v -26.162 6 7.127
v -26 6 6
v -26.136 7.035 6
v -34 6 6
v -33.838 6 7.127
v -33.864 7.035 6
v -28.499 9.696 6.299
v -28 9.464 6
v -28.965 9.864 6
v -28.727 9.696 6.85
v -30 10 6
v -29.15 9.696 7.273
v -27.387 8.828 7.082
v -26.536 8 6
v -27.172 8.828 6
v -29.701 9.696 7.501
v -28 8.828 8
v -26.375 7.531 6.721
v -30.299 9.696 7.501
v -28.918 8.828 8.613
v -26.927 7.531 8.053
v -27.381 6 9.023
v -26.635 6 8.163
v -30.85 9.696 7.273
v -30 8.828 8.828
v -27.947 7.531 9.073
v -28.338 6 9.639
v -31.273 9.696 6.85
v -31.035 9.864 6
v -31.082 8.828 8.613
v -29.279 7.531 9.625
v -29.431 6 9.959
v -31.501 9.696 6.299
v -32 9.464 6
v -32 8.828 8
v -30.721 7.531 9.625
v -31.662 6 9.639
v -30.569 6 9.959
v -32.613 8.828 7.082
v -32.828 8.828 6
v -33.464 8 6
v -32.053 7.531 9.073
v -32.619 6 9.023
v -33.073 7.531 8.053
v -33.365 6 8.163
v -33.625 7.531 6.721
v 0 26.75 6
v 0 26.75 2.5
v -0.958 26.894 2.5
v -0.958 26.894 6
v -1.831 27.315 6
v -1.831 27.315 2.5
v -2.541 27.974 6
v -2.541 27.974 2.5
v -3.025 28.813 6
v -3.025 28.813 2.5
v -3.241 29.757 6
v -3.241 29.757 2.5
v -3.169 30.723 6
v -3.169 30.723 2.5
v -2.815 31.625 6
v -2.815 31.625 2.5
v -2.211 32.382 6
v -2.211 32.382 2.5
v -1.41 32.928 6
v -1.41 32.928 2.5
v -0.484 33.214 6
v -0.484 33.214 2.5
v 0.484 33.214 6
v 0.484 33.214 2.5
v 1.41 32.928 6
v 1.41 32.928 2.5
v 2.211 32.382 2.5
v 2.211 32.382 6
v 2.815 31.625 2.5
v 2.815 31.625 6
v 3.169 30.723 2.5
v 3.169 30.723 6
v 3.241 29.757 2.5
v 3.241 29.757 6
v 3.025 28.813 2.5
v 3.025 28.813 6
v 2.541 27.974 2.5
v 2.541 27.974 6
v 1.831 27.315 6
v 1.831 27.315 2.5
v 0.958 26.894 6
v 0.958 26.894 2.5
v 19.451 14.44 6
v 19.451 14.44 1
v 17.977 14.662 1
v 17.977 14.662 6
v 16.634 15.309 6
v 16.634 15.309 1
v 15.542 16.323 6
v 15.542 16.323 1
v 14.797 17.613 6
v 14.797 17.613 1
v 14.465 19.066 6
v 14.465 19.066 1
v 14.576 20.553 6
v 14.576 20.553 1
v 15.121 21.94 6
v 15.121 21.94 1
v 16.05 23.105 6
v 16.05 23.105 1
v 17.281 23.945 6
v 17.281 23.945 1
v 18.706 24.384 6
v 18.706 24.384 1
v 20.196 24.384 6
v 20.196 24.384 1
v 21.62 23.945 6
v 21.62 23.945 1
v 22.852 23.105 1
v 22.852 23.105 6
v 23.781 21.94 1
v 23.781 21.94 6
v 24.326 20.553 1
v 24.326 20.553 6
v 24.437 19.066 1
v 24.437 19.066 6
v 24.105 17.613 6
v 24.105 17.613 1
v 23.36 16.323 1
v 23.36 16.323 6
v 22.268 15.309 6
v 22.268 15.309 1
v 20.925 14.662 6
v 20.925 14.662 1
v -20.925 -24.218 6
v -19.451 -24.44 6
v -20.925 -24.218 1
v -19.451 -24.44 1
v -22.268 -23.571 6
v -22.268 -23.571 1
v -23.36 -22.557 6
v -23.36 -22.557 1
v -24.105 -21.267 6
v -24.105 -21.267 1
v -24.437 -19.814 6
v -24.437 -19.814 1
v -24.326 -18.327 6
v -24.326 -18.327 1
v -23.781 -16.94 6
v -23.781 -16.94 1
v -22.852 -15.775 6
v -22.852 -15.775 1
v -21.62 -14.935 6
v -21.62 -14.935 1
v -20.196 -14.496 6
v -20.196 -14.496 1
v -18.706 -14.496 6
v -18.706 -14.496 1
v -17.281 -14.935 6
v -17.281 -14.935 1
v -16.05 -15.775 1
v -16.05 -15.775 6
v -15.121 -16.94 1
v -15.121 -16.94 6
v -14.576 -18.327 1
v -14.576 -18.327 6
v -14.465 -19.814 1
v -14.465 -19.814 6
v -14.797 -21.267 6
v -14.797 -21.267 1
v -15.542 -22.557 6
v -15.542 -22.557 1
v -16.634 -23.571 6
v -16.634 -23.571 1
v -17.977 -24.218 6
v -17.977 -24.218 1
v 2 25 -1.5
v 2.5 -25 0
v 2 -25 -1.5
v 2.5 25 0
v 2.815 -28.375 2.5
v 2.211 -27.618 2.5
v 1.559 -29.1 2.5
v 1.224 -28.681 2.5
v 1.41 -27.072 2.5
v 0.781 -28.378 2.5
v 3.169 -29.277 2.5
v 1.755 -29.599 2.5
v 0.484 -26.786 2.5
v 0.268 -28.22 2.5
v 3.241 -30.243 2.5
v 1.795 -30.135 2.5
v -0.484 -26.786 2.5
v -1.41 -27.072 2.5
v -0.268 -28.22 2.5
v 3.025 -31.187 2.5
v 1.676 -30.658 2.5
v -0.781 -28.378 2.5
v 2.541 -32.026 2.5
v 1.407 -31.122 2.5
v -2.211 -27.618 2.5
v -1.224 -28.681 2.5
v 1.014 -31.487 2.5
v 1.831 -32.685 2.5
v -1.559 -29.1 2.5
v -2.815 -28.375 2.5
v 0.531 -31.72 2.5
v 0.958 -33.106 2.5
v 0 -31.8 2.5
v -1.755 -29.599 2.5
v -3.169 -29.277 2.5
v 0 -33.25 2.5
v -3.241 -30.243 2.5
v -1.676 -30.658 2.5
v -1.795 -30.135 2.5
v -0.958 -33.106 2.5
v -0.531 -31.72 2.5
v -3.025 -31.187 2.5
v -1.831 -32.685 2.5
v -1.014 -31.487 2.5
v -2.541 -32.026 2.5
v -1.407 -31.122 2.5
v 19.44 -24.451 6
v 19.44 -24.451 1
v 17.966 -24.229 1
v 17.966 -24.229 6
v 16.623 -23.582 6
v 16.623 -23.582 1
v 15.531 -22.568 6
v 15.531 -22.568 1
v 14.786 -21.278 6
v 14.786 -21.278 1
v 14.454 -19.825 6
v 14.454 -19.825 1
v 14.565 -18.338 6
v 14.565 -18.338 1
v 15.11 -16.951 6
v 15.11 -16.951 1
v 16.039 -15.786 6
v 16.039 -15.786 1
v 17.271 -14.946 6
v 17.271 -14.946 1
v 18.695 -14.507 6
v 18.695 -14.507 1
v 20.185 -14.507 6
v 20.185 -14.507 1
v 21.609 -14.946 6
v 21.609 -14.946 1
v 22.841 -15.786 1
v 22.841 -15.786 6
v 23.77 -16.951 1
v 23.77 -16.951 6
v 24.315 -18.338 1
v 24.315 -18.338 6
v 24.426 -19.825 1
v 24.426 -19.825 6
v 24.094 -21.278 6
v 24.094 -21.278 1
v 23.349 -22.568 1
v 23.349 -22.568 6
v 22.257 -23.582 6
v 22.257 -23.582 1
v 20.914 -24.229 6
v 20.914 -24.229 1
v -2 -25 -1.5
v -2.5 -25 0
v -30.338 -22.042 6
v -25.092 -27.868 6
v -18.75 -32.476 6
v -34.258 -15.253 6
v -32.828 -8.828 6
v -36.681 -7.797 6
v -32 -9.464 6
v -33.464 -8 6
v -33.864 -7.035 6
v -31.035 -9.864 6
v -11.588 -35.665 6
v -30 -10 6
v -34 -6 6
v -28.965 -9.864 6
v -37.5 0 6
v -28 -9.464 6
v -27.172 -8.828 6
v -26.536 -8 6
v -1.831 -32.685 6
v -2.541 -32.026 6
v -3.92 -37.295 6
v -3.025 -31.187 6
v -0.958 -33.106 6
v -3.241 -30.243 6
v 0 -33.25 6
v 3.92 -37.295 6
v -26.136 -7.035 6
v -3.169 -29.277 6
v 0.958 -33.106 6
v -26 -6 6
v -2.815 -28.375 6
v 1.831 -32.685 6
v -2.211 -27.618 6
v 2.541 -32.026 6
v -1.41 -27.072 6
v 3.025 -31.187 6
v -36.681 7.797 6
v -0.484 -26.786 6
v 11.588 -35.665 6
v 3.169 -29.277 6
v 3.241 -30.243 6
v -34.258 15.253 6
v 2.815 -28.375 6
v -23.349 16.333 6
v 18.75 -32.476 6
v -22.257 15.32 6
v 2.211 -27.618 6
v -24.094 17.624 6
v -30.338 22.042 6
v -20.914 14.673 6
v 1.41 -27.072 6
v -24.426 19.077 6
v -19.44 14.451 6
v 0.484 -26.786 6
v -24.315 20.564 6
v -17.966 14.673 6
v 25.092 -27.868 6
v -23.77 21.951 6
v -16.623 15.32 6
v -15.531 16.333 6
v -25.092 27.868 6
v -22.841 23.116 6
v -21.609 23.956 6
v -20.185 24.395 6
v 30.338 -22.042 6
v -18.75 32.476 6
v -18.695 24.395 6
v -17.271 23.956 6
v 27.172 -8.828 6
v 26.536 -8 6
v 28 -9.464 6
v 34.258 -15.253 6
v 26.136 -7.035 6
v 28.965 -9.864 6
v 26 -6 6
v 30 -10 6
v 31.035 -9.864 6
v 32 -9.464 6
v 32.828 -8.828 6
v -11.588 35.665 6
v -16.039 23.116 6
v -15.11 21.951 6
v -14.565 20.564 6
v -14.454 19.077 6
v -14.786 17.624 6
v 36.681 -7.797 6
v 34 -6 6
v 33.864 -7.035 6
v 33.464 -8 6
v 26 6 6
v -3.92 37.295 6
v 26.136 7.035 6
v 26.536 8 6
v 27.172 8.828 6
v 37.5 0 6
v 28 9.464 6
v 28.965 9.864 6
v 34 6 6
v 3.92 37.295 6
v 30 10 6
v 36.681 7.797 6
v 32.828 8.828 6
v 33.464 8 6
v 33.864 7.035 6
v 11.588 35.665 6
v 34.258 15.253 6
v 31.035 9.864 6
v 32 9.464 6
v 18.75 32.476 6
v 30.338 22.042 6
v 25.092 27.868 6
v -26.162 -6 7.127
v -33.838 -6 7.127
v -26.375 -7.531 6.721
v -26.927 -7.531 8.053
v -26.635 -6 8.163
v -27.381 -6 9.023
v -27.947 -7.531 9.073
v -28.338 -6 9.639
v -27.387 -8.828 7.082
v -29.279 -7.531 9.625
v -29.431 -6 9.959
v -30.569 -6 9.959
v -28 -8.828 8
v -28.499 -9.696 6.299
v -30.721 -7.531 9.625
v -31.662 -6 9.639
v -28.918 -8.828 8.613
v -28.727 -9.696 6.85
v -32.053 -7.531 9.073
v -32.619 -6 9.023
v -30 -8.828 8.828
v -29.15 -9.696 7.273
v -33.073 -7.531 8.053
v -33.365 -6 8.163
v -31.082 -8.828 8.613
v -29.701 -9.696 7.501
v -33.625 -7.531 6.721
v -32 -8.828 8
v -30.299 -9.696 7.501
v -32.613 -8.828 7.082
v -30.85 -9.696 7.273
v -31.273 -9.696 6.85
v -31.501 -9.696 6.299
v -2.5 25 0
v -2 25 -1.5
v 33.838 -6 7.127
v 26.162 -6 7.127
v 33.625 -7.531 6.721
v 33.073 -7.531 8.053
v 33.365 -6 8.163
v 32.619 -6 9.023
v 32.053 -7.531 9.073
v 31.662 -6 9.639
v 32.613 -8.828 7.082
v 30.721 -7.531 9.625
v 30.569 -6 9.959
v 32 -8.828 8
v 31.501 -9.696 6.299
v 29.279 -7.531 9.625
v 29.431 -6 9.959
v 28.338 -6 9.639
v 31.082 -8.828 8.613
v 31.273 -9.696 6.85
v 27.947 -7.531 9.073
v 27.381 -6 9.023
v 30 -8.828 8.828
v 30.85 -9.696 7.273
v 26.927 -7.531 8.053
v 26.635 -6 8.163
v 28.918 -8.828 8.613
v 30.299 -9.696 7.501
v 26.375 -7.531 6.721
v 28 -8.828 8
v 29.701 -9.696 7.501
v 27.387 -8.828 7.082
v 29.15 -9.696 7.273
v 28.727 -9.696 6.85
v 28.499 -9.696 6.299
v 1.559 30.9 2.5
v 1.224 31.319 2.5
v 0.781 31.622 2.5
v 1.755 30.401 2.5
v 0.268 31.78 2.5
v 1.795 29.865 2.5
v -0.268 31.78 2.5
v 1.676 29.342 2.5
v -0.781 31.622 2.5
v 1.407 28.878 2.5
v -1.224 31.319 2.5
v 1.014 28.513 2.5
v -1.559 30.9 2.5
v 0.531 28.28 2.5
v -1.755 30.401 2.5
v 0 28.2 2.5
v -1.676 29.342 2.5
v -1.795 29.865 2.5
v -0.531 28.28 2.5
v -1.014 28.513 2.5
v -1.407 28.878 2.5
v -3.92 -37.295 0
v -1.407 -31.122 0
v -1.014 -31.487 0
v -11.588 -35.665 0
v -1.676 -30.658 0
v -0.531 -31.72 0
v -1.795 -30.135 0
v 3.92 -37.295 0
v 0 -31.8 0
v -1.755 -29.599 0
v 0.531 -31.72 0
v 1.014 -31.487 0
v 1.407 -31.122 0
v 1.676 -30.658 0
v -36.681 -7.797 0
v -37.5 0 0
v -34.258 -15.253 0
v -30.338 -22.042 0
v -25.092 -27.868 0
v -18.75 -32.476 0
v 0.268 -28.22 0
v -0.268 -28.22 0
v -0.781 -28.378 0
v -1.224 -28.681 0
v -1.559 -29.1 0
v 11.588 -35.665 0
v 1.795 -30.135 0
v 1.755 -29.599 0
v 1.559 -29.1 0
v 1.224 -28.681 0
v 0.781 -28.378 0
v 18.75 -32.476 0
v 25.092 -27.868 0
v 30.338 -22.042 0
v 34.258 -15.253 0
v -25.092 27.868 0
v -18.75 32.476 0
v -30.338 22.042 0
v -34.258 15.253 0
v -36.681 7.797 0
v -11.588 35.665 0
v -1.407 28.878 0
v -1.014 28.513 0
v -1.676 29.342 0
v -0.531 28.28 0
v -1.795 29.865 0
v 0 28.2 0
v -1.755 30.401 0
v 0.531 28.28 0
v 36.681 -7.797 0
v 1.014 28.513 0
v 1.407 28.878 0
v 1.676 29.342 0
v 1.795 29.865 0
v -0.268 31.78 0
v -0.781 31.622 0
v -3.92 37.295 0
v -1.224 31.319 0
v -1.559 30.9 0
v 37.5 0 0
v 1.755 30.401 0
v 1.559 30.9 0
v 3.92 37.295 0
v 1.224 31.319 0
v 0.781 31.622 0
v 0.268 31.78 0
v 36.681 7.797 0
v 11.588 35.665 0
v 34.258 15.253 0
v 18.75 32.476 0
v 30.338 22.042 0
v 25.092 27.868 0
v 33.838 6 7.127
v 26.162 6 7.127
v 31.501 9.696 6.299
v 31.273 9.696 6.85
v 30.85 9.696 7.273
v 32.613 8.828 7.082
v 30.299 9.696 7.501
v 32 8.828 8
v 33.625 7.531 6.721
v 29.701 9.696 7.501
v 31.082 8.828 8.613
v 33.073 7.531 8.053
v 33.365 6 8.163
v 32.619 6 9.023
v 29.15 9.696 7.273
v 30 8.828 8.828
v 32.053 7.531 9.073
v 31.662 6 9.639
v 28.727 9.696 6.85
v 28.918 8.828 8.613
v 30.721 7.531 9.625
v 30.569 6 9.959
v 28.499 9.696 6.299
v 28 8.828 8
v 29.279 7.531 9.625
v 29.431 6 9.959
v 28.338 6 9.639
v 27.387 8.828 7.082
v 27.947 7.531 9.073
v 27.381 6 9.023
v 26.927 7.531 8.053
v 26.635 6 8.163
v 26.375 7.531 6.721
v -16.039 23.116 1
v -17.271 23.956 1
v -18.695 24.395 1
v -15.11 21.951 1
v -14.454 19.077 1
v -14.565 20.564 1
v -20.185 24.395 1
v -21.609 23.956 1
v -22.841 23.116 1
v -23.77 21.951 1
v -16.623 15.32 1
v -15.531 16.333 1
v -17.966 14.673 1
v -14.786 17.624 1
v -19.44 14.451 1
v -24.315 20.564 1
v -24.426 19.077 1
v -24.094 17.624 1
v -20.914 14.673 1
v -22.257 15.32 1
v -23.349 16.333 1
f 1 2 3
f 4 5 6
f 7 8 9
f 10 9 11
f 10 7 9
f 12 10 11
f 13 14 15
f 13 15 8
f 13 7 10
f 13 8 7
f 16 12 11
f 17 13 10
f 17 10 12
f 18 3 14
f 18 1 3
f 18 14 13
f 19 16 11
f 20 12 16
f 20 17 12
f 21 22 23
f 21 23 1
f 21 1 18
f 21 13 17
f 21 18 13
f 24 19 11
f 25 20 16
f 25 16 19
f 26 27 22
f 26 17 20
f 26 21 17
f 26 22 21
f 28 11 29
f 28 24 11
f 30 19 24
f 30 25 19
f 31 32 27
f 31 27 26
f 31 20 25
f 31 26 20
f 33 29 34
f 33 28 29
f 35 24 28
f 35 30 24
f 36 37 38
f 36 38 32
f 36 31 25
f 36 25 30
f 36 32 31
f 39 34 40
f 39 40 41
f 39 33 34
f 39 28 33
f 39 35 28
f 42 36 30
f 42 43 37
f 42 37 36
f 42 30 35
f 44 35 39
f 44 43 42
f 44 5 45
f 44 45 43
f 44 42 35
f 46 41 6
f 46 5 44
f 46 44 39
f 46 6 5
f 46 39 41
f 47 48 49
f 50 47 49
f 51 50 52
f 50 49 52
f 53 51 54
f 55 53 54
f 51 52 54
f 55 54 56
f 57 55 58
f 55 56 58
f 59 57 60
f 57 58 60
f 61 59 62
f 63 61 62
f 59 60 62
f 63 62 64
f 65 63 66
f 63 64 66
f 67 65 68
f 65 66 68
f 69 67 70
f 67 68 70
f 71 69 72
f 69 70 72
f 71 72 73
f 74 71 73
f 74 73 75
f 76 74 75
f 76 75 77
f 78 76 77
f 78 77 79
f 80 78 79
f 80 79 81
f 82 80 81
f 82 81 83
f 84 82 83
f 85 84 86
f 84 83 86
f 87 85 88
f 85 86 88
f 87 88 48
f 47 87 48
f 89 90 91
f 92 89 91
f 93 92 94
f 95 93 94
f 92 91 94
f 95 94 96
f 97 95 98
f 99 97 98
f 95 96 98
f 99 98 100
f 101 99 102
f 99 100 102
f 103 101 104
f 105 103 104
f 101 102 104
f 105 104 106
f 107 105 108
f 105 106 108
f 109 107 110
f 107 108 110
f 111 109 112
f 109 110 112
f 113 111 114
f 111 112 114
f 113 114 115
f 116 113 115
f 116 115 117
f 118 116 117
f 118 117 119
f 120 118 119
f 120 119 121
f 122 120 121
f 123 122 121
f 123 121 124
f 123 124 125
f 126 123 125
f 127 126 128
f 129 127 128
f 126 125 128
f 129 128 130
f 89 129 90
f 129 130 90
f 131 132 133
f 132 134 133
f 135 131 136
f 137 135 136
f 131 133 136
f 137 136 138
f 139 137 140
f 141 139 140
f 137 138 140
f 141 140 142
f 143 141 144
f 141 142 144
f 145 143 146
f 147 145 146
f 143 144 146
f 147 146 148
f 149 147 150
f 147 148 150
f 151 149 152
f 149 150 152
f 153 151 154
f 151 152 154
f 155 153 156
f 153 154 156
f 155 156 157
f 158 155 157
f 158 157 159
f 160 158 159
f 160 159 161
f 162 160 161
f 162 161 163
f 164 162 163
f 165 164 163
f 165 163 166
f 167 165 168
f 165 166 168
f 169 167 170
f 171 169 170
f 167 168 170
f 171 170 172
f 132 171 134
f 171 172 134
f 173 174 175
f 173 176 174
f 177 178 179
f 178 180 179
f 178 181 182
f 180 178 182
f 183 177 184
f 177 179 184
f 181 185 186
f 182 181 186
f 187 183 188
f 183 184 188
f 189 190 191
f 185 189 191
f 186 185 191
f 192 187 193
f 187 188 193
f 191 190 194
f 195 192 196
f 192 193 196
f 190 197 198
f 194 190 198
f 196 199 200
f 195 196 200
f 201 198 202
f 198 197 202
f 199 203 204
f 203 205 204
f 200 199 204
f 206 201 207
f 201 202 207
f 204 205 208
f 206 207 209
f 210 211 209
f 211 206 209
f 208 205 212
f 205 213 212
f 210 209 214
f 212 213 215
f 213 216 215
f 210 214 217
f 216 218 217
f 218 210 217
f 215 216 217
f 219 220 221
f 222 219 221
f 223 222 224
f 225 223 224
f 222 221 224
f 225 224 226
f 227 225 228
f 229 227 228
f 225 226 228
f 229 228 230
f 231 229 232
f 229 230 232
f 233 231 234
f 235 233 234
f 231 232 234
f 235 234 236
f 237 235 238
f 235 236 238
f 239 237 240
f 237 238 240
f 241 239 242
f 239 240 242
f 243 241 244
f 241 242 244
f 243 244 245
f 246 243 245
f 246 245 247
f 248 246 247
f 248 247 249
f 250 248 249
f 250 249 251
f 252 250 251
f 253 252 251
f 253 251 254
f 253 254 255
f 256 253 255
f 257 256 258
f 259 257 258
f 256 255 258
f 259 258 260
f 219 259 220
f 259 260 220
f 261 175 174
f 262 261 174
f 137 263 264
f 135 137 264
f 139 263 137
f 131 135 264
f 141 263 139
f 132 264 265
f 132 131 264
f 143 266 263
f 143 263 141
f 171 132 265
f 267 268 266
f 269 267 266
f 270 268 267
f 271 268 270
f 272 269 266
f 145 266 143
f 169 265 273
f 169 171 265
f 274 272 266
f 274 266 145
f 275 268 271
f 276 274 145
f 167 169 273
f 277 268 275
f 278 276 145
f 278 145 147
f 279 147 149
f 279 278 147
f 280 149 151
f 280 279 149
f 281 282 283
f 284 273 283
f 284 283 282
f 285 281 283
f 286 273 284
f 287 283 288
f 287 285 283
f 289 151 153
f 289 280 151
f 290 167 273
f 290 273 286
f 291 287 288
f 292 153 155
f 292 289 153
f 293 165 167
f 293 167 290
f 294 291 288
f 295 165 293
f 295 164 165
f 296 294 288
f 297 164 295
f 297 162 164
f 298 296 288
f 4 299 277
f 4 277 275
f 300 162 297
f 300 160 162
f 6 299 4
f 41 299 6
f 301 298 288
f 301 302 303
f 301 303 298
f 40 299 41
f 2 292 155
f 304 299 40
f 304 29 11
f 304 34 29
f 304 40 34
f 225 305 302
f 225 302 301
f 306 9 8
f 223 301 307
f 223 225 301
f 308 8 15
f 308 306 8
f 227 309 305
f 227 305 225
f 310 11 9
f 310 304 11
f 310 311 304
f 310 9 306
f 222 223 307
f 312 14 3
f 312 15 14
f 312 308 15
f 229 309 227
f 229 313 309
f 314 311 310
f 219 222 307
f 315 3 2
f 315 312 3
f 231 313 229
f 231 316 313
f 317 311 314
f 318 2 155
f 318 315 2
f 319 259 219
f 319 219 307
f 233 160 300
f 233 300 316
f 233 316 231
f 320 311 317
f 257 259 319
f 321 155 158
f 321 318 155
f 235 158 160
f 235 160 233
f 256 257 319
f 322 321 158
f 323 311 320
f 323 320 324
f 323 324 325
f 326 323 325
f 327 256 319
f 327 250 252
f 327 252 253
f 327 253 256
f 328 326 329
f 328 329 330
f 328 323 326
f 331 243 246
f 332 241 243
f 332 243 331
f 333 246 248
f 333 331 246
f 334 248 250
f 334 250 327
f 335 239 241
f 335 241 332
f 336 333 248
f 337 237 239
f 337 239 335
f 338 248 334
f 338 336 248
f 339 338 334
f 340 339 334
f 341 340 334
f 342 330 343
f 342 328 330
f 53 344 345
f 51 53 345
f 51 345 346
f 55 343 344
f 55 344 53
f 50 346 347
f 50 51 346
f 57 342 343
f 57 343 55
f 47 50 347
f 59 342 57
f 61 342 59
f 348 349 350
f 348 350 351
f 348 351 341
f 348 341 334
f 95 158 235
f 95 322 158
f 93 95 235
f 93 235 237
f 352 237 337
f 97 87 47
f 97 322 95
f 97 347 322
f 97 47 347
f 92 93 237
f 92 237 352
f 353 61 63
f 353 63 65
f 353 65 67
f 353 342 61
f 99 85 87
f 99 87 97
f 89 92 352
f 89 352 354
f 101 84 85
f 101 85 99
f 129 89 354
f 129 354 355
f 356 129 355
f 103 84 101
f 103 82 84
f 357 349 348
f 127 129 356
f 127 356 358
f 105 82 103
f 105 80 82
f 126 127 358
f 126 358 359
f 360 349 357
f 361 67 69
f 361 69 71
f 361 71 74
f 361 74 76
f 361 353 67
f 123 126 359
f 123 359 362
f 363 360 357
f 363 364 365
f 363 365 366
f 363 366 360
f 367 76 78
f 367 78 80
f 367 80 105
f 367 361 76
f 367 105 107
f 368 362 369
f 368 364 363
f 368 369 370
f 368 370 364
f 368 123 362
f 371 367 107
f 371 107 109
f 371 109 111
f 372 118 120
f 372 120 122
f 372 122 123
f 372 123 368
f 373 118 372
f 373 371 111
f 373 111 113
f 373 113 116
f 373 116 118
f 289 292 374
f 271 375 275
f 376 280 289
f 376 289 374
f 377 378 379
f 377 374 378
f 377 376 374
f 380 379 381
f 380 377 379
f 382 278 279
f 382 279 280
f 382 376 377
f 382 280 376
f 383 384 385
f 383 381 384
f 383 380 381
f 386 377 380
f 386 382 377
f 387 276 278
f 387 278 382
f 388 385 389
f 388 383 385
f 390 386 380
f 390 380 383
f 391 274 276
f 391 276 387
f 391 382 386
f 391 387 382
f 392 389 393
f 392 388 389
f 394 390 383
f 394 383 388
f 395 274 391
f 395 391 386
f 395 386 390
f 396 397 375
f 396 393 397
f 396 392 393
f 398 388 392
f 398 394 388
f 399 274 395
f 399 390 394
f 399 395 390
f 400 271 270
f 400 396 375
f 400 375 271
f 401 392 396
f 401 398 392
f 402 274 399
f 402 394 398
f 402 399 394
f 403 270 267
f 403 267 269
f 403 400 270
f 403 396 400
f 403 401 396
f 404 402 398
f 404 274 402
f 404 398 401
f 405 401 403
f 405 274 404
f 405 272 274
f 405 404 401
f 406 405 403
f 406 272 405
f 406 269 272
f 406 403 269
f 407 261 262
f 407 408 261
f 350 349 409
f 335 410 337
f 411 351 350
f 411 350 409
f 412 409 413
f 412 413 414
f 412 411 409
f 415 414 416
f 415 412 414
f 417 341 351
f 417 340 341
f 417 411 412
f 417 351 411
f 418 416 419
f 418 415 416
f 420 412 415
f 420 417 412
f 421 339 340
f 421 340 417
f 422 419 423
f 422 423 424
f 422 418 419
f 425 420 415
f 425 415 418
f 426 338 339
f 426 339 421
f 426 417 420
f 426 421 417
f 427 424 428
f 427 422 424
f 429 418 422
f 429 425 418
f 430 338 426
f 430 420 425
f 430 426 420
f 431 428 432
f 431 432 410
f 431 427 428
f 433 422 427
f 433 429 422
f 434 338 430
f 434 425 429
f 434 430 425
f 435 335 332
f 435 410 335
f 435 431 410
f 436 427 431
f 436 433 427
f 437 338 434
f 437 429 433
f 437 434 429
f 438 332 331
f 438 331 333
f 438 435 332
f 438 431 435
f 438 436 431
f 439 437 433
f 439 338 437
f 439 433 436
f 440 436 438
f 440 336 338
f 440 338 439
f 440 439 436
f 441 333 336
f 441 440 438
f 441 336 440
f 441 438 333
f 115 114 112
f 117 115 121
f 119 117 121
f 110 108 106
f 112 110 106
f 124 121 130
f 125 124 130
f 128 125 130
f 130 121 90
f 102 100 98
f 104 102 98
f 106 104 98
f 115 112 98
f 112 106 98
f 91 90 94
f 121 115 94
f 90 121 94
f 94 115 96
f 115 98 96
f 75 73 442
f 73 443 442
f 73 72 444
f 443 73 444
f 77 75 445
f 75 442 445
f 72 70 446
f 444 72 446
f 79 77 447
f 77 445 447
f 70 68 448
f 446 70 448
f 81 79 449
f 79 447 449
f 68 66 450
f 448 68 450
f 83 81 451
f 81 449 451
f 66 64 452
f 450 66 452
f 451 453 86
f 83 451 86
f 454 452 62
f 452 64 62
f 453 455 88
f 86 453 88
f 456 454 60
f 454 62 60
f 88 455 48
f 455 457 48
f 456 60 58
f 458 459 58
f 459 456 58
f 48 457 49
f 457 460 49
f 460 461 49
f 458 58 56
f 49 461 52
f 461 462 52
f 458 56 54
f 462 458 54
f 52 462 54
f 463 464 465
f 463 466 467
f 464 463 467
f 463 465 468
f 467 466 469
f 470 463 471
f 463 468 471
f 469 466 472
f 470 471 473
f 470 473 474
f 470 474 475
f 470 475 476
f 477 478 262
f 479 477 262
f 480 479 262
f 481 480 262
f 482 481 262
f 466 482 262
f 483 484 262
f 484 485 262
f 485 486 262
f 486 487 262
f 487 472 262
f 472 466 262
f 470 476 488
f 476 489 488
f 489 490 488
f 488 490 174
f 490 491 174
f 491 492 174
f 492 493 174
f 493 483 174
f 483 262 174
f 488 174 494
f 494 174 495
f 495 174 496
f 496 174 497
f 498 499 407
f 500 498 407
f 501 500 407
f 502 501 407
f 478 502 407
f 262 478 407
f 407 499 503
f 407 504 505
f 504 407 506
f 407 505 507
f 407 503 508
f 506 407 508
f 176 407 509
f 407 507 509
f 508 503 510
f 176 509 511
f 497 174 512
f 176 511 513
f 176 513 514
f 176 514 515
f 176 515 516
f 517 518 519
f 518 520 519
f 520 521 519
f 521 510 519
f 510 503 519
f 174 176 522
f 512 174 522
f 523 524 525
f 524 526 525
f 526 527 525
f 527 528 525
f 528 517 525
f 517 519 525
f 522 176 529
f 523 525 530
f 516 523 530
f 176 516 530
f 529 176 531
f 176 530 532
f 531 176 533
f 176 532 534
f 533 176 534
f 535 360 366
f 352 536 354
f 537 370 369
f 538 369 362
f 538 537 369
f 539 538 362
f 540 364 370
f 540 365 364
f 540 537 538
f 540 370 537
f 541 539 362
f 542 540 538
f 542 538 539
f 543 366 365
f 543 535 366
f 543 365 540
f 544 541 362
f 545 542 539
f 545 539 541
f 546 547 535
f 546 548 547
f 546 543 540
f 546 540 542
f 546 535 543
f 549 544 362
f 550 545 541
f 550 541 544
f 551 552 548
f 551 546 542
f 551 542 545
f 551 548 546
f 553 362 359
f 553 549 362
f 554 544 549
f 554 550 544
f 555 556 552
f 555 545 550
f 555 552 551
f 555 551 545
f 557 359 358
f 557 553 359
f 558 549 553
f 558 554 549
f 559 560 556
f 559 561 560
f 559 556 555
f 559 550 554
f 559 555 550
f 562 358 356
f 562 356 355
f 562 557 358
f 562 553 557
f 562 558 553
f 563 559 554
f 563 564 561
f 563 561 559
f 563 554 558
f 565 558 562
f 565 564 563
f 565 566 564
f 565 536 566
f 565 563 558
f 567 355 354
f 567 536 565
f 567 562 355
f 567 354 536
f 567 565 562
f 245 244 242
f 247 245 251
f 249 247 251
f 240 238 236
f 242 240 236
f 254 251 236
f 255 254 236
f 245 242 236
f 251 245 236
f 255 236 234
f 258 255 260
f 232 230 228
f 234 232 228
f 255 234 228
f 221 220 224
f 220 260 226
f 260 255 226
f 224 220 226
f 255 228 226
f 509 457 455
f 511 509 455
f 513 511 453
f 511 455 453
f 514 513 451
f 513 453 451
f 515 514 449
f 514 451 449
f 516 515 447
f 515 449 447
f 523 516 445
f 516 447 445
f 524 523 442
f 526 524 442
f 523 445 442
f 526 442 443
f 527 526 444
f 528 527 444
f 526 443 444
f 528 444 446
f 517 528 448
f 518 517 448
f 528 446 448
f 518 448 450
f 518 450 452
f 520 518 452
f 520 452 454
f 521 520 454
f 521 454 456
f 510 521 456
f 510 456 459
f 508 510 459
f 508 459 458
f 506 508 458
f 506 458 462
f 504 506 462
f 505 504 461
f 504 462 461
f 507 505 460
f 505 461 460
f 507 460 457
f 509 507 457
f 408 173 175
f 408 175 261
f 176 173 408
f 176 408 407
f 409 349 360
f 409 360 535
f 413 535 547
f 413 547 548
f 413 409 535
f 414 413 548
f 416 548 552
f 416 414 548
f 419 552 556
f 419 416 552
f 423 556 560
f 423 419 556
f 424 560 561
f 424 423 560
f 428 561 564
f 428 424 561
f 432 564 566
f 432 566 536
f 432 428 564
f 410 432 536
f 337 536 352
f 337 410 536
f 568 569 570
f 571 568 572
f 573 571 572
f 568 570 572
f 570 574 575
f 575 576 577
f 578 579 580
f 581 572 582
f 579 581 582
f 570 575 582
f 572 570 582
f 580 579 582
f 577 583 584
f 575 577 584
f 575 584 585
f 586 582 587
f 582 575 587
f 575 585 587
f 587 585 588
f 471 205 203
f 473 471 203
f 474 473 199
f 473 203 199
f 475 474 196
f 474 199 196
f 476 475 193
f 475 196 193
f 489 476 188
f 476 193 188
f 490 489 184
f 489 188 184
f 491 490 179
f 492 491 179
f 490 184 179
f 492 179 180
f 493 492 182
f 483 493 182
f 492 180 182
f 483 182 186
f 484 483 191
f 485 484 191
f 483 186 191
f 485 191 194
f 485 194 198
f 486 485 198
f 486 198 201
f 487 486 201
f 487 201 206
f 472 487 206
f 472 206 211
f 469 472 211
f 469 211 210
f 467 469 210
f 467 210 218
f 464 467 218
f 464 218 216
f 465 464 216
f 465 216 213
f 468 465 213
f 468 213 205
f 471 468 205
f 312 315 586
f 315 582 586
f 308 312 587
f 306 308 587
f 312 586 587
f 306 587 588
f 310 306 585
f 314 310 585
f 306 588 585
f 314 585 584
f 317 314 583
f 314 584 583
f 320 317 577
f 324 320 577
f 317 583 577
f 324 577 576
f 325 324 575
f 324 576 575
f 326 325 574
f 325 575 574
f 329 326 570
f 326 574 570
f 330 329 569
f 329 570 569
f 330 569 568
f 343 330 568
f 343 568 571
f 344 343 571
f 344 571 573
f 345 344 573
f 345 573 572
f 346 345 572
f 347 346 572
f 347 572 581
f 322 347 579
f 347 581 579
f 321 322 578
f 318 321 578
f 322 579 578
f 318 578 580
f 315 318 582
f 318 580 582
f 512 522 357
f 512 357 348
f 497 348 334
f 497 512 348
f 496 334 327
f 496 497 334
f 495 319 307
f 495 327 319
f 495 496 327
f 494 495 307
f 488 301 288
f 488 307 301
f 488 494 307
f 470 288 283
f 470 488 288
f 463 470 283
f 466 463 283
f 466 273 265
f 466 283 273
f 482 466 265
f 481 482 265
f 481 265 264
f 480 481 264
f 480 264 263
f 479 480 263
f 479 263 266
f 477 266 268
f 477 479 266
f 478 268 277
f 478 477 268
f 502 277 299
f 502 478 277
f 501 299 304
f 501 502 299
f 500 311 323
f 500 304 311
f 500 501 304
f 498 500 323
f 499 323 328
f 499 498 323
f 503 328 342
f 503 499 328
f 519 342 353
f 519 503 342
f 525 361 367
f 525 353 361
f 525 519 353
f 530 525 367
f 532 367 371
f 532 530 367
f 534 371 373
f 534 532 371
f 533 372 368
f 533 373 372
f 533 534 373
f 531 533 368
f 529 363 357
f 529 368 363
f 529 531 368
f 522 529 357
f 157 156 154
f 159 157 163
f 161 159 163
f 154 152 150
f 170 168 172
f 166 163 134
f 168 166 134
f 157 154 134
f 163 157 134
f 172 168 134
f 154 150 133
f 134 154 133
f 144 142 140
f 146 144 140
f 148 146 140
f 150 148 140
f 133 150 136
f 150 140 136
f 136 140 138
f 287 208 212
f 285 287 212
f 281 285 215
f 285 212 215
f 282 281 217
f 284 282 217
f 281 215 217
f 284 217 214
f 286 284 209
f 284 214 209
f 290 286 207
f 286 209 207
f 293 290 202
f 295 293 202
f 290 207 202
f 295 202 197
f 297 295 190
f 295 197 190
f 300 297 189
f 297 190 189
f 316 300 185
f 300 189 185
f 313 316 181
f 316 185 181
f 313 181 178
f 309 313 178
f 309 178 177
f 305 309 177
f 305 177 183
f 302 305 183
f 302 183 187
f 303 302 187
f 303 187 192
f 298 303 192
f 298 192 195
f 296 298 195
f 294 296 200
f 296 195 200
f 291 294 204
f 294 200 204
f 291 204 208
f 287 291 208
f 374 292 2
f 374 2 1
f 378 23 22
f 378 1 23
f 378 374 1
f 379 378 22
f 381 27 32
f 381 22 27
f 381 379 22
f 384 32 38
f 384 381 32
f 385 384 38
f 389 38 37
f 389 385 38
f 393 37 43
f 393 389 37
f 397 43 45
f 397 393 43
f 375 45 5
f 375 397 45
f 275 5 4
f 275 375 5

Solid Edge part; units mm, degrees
sketch "Sketch1" plane through (0, 0, 0) normal (0, 0, 1) x (1, 0, 0)
  circle A0 centre (0, 0) radius 37.5
extrude "Extrusionsausprägung_1" add sketch "Sketch1" along normal blind 6
hole "Bohrung_1" at (-19.44, 19.4509, 6) direction (0, 0, -1) diameter 10 depth 5
hole "Hole1" at (19.4509, 19.44, 6) direction (0, 0, -1) diameter 10 depth 5
hole "Hole2" at (19.44, -19.4509, 6) direction (0, 0, -1) diameter 10 depth 5
hole "Hole3" at (-19.4509, -19.44, 6) direction (0, 0, -1) diameter 10 depth 5
sketch "Sketch2" plane through (0, 0, 0) normal (0, -1, 0) x (1, 0, 0)
  line L0 (-2.5, 0) -> (2.5, 0)
  line L1 (2.5, 0) -> (2, -1.5)
  line L2 (2, -1.5) -> (-2, -1.5)
  line L3 (-2, -1.5) -> (-2.5, 0)
  dimension "D1" = 4
  dimension "D2" = 5
  dimension "D3" = 1.5
extrude "Extrusionsausprägung_2" add sketch "Sketch2" along normal mid plane 50
hole "Bohrung_5" at (0, 30, 6) direction (0, 0, -1) diameter 3.6 end up to next counterbore diameter 6.5 counterbore depth 3.5
hole "Hole4" at (0, -30, 6) direction (0, 0, -1) diameter 3.6 end up to next counterbore diameter 6.5 counterbore depth 3.5
sketch "Sketch3" plane through (0, 0, 6) normal (0, 0, 1) x (-1, 0, 0)
  line L0 (34, -6) -> (34, 6)
  arc A0 (34, 6) -> (30, 10) centre (30, 6) ccw
  arc A1 (30, -10) -> (34, -6) centre (30, -6) ccw
  dimension "D1" = 20
  dimension "D2" = 4
  dimension "D3" = 30
revolve "Rotationsausprägung_1" add sketch "Sketch3" angle 360 about axis through (-30, -10, 6) along (0, 1, 0)
mirror "Mirror1" about plane through (0, 0, 0) normal (1, 0, 0) of "Rotationsausprägung_1"
